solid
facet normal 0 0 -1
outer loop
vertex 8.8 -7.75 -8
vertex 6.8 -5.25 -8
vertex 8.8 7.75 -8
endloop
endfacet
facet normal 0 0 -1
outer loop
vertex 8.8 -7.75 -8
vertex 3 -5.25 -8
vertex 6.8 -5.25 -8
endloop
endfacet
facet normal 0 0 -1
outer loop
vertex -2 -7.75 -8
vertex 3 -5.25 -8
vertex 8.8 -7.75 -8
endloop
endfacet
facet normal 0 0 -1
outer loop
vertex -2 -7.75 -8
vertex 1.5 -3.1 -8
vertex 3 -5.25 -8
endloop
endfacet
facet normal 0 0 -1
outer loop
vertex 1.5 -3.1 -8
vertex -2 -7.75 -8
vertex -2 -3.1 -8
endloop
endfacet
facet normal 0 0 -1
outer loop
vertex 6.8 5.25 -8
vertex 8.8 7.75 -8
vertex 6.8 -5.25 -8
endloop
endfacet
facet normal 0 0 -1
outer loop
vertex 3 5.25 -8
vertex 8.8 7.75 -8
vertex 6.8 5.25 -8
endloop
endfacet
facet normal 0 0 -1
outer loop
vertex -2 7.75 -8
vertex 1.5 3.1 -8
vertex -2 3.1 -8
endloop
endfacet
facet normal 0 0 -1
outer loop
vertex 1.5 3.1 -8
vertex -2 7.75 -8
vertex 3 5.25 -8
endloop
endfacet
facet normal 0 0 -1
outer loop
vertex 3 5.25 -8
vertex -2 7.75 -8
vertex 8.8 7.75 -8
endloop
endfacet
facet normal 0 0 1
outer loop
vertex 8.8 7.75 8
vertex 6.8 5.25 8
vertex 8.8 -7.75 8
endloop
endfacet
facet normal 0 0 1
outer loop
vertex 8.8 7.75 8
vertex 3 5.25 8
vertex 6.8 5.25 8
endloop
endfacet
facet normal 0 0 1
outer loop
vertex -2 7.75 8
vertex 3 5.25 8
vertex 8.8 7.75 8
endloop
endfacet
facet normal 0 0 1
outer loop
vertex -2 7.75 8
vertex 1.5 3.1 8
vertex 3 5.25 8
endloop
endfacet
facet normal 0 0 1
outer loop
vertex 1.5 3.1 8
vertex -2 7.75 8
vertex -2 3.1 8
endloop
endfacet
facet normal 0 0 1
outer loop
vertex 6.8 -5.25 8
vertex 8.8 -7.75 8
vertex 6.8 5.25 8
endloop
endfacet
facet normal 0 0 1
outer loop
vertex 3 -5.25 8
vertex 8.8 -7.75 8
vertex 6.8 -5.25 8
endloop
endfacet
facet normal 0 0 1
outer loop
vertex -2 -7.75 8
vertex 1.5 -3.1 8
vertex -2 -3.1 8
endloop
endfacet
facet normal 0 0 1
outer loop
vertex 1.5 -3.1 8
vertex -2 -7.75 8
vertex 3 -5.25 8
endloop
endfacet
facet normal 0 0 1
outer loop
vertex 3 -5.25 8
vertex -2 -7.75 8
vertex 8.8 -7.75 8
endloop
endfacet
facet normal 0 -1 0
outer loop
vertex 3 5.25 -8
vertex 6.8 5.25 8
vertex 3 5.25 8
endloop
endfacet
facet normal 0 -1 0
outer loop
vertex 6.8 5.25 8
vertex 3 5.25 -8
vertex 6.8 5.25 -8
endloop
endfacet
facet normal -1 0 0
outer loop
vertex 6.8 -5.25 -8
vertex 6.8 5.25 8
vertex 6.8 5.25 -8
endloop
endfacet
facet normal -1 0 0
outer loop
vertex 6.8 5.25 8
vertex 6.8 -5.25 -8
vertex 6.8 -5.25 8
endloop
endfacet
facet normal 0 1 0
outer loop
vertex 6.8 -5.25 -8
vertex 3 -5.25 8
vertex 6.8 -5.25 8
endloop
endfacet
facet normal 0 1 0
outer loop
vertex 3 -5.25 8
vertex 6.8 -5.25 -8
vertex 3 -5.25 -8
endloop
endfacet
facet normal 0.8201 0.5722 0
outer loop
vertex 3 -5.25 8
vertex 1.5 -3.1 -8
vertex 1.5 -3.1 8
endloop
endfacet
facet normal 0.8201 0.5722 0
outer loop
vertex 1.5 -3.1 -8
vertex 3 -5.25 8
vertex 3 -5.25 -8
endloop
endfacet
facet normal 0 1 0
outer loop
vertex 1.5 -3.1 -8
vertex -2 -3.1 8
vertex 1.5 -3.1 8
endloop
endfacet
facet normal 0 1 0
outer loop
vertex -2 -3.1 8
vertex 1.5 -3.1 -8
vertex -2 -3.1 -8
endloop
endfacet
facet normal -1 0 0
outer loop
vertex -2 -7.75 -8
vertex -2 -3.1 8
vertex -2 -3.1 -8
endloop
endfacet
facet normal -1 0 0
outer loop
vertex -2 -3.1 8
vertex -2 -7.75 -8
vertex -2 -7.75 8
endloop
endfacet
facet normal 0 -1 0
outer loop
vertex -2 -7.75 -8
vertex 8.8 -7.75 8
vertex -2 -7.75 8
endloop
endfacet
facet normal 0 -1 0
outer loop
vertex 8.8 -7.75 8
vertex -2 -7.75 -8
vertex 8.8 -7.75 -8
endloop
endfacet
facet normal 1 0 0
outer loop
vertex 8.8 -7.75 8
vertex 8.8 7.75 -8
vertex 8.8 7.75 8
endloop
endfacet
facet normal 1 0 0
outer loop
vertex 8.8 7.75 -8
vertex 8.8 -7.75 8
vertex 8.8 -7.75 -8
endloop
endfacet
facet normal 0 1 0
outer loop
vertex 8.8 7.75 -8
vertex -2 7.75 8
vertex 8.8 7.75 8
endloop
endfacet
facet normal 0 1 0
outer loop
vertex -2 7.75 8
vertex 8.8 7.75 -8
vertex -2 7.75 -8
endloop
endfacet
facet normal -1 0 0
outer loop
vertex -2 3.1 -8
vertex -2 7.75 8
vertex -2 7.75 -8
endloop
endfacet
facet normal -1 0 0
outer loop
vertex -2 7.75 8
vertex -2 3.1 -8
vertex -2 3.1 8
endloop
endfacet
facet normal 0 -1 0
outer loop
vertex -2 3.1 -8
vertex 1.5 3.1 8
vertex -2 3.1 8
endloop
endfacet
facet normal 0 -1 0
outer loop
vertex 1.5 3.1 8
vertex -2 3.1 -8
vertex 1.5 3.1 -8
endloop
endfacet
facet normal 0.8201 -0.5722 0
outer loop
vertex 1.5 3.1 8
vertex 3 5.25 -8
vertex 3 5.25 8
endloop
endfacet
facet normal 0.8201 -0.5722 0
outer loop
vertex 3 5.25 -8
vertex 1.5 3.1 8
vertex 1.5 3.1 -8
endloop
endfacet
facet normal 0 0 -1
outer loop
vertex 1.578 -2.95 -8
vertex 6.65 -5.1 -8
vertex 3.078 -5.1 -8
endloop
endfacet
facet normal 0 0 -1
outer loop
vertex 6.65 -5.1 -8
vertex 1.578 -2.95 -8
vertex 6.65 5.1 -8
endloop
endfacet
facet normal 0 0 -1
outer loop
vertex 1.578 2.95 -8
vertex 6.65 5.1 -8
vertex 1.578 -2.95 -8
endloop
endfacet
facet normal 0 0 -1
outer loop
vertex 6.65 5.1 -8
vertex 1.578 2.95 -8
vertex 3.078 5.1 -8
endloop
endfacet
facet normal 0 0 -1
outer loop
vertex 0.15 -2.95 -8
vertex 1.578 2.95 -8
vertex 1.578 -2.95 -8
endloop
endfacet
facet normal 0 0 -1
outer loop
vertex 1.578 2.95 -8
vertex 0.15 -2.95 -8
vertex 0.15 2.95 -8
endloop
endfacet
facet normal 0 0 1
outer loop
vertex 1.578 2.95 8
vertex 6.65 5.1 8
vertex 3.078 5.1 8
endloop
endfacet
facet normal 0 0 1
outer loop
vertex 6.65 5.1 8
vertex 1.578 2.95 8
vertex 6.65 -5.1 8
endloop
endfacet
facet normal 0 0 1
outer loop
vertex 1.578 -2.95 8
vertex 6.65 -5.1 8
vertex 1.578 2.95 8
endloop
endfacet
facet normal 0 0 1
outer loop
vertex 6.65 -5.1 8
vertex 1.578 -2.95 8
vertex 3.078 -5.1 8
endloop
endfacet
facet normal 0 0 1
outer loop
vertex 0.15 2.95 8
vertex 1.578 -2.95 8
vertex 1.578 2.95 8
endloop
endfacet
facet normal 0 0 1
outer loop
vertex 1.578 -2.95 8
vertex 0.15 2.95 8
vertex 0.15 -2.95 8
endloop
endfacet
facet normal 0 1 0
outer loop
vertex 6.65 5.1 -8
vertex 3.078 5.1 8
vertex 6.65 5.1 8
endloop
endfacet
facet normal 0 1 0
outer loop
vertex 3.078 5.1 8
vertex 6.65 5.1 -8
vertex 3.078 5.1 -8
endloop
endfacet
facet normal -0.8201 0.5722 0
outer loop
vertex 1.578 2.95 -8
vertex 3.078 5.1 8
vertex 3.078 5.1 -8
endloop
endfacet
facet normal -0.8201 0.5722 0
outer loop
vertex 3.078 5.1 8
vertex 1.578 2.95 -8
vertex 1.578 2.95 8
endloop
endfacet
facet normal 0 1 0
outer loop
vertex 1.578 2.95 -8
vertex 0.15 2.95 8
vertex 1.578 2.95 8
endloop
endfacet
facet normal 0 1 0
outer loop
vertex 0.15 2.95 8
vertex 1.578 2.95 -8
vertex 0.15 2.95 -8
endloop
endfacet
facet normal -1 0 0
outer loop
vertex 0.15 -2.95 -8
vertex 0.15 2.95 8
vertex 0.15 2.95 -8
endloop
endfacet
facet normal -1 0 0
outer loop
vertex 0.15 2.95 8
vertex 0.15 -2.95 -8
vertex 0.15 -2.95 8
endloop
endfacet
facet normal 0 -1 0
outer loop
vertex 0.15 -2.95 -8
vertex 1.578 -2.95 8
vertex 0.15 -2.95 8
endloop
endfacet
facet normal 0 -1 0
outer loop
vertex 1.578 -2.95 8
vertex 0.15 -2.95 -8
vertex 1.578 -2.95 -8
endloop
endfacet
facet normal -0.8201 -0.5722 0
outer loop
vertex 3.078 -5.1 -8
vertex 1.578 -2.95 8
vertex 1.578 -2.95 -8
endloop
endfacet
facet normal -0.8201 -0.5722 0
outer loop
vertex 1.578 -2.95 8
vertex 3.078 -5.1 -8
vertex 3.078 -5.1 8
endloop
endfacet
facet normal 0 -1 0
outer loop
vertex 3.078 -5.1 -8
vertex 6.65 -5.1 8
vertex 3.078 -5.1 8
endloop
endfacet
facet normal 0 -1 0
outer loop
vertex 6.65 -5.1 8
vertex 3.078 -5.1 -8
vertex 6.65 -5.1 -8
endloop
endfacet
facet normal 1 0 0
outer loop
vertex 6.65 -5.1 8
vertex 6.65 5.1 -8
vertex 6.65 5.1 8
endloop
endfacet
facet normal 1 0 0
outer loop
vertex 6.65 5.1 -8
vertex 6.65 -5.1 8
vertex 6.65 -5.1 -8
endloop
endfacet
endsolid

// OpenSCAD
// /cad/tslot/tslot_fit_lab.scad
// PARAMETRIC TEST COUPON — NOT A VERIFIED 4040 MANUFACTURER PROFILE.
// Axes: X = inward from extrusion outer face; Y = across slot; Z = rail length.
// Mouth at X=0, cavity extends toward positive X.
$fn=48;
view="assembly"; // "assembly", "interference", "key", "section"
length=16;
cavity_height=10.5;
slot_opening=6.2;
cavity_depth=6.8;
lip_depth=1.5;
chamfer_run=1.5;
clearance=0.15; // radial 2D offset for key
// The polygon below is an illustrative six-sided cavity approximation.
// Confirm exact cavity boundaries from a manufacturer STEP/DXF before use.
module cavity_2d() {
    polygon([
      [0,-slot_opening/2],
      [lip_depth,-slot_opening/2],
      [lip_depth+chamfer_run,-cavity_height/2],
      [cavity_depth,-cavity_height/2],
      [cavity_depth,cavity_height/2],
      [lip_depth+chamfer_run,cavity_height/2],
      [lip_depth,slot_opening/2],
      [0,slot_opening/2]
    ]);
}
// Open-mouth neck is intentionally narrower than head; shape slides from rail end.
module key_2d() {
    offset(delta=-clearance) cavity_2d();
}
module cavity_3d(){linear_extrude(height=length,center=true) cavity_2d();}
module key_3d(){linear_extrude(height=length,center=true) key_2d();}
// A reference solid around cavity, open at x=0 (not a full 4040 profile).
module reference_wall_3d(){
  linear_extrude(height=length,center=true)
  difference(){
    translate([cavity_depth/2,0]) square([cavity_depth+4,cavity_height+5],center=true);
    cavity_2d();
    // Open access from the left edge through the mouth
    translate([-2,0]) square([4.01,slot_opening],center=true);
  }
}
assert(cavity_depth>lip_depth+chamfer_run,"Cavity depth must exceed lip + chamfer run");
assert(cavity_height>slot_opening,"Cavity height must exceed mouth height");
assert(clearance>=0 && clearance<slot_opening/4,"Check clearance");
if(view=="assembly"){
 color("silver",0.38) reference_wall_3d();
 color("orange") key_3d();
} else if(view=="interference"){
 color("red") intersection(){reference_wall_3d();key_3d();}
} else if(view=="key"){
 color("orange") key_3d();
} else if(view=="section"){
 color("silver",0.45) projection(cut=false) reference_wall_3d();
 color("orange") key_2d();
}
